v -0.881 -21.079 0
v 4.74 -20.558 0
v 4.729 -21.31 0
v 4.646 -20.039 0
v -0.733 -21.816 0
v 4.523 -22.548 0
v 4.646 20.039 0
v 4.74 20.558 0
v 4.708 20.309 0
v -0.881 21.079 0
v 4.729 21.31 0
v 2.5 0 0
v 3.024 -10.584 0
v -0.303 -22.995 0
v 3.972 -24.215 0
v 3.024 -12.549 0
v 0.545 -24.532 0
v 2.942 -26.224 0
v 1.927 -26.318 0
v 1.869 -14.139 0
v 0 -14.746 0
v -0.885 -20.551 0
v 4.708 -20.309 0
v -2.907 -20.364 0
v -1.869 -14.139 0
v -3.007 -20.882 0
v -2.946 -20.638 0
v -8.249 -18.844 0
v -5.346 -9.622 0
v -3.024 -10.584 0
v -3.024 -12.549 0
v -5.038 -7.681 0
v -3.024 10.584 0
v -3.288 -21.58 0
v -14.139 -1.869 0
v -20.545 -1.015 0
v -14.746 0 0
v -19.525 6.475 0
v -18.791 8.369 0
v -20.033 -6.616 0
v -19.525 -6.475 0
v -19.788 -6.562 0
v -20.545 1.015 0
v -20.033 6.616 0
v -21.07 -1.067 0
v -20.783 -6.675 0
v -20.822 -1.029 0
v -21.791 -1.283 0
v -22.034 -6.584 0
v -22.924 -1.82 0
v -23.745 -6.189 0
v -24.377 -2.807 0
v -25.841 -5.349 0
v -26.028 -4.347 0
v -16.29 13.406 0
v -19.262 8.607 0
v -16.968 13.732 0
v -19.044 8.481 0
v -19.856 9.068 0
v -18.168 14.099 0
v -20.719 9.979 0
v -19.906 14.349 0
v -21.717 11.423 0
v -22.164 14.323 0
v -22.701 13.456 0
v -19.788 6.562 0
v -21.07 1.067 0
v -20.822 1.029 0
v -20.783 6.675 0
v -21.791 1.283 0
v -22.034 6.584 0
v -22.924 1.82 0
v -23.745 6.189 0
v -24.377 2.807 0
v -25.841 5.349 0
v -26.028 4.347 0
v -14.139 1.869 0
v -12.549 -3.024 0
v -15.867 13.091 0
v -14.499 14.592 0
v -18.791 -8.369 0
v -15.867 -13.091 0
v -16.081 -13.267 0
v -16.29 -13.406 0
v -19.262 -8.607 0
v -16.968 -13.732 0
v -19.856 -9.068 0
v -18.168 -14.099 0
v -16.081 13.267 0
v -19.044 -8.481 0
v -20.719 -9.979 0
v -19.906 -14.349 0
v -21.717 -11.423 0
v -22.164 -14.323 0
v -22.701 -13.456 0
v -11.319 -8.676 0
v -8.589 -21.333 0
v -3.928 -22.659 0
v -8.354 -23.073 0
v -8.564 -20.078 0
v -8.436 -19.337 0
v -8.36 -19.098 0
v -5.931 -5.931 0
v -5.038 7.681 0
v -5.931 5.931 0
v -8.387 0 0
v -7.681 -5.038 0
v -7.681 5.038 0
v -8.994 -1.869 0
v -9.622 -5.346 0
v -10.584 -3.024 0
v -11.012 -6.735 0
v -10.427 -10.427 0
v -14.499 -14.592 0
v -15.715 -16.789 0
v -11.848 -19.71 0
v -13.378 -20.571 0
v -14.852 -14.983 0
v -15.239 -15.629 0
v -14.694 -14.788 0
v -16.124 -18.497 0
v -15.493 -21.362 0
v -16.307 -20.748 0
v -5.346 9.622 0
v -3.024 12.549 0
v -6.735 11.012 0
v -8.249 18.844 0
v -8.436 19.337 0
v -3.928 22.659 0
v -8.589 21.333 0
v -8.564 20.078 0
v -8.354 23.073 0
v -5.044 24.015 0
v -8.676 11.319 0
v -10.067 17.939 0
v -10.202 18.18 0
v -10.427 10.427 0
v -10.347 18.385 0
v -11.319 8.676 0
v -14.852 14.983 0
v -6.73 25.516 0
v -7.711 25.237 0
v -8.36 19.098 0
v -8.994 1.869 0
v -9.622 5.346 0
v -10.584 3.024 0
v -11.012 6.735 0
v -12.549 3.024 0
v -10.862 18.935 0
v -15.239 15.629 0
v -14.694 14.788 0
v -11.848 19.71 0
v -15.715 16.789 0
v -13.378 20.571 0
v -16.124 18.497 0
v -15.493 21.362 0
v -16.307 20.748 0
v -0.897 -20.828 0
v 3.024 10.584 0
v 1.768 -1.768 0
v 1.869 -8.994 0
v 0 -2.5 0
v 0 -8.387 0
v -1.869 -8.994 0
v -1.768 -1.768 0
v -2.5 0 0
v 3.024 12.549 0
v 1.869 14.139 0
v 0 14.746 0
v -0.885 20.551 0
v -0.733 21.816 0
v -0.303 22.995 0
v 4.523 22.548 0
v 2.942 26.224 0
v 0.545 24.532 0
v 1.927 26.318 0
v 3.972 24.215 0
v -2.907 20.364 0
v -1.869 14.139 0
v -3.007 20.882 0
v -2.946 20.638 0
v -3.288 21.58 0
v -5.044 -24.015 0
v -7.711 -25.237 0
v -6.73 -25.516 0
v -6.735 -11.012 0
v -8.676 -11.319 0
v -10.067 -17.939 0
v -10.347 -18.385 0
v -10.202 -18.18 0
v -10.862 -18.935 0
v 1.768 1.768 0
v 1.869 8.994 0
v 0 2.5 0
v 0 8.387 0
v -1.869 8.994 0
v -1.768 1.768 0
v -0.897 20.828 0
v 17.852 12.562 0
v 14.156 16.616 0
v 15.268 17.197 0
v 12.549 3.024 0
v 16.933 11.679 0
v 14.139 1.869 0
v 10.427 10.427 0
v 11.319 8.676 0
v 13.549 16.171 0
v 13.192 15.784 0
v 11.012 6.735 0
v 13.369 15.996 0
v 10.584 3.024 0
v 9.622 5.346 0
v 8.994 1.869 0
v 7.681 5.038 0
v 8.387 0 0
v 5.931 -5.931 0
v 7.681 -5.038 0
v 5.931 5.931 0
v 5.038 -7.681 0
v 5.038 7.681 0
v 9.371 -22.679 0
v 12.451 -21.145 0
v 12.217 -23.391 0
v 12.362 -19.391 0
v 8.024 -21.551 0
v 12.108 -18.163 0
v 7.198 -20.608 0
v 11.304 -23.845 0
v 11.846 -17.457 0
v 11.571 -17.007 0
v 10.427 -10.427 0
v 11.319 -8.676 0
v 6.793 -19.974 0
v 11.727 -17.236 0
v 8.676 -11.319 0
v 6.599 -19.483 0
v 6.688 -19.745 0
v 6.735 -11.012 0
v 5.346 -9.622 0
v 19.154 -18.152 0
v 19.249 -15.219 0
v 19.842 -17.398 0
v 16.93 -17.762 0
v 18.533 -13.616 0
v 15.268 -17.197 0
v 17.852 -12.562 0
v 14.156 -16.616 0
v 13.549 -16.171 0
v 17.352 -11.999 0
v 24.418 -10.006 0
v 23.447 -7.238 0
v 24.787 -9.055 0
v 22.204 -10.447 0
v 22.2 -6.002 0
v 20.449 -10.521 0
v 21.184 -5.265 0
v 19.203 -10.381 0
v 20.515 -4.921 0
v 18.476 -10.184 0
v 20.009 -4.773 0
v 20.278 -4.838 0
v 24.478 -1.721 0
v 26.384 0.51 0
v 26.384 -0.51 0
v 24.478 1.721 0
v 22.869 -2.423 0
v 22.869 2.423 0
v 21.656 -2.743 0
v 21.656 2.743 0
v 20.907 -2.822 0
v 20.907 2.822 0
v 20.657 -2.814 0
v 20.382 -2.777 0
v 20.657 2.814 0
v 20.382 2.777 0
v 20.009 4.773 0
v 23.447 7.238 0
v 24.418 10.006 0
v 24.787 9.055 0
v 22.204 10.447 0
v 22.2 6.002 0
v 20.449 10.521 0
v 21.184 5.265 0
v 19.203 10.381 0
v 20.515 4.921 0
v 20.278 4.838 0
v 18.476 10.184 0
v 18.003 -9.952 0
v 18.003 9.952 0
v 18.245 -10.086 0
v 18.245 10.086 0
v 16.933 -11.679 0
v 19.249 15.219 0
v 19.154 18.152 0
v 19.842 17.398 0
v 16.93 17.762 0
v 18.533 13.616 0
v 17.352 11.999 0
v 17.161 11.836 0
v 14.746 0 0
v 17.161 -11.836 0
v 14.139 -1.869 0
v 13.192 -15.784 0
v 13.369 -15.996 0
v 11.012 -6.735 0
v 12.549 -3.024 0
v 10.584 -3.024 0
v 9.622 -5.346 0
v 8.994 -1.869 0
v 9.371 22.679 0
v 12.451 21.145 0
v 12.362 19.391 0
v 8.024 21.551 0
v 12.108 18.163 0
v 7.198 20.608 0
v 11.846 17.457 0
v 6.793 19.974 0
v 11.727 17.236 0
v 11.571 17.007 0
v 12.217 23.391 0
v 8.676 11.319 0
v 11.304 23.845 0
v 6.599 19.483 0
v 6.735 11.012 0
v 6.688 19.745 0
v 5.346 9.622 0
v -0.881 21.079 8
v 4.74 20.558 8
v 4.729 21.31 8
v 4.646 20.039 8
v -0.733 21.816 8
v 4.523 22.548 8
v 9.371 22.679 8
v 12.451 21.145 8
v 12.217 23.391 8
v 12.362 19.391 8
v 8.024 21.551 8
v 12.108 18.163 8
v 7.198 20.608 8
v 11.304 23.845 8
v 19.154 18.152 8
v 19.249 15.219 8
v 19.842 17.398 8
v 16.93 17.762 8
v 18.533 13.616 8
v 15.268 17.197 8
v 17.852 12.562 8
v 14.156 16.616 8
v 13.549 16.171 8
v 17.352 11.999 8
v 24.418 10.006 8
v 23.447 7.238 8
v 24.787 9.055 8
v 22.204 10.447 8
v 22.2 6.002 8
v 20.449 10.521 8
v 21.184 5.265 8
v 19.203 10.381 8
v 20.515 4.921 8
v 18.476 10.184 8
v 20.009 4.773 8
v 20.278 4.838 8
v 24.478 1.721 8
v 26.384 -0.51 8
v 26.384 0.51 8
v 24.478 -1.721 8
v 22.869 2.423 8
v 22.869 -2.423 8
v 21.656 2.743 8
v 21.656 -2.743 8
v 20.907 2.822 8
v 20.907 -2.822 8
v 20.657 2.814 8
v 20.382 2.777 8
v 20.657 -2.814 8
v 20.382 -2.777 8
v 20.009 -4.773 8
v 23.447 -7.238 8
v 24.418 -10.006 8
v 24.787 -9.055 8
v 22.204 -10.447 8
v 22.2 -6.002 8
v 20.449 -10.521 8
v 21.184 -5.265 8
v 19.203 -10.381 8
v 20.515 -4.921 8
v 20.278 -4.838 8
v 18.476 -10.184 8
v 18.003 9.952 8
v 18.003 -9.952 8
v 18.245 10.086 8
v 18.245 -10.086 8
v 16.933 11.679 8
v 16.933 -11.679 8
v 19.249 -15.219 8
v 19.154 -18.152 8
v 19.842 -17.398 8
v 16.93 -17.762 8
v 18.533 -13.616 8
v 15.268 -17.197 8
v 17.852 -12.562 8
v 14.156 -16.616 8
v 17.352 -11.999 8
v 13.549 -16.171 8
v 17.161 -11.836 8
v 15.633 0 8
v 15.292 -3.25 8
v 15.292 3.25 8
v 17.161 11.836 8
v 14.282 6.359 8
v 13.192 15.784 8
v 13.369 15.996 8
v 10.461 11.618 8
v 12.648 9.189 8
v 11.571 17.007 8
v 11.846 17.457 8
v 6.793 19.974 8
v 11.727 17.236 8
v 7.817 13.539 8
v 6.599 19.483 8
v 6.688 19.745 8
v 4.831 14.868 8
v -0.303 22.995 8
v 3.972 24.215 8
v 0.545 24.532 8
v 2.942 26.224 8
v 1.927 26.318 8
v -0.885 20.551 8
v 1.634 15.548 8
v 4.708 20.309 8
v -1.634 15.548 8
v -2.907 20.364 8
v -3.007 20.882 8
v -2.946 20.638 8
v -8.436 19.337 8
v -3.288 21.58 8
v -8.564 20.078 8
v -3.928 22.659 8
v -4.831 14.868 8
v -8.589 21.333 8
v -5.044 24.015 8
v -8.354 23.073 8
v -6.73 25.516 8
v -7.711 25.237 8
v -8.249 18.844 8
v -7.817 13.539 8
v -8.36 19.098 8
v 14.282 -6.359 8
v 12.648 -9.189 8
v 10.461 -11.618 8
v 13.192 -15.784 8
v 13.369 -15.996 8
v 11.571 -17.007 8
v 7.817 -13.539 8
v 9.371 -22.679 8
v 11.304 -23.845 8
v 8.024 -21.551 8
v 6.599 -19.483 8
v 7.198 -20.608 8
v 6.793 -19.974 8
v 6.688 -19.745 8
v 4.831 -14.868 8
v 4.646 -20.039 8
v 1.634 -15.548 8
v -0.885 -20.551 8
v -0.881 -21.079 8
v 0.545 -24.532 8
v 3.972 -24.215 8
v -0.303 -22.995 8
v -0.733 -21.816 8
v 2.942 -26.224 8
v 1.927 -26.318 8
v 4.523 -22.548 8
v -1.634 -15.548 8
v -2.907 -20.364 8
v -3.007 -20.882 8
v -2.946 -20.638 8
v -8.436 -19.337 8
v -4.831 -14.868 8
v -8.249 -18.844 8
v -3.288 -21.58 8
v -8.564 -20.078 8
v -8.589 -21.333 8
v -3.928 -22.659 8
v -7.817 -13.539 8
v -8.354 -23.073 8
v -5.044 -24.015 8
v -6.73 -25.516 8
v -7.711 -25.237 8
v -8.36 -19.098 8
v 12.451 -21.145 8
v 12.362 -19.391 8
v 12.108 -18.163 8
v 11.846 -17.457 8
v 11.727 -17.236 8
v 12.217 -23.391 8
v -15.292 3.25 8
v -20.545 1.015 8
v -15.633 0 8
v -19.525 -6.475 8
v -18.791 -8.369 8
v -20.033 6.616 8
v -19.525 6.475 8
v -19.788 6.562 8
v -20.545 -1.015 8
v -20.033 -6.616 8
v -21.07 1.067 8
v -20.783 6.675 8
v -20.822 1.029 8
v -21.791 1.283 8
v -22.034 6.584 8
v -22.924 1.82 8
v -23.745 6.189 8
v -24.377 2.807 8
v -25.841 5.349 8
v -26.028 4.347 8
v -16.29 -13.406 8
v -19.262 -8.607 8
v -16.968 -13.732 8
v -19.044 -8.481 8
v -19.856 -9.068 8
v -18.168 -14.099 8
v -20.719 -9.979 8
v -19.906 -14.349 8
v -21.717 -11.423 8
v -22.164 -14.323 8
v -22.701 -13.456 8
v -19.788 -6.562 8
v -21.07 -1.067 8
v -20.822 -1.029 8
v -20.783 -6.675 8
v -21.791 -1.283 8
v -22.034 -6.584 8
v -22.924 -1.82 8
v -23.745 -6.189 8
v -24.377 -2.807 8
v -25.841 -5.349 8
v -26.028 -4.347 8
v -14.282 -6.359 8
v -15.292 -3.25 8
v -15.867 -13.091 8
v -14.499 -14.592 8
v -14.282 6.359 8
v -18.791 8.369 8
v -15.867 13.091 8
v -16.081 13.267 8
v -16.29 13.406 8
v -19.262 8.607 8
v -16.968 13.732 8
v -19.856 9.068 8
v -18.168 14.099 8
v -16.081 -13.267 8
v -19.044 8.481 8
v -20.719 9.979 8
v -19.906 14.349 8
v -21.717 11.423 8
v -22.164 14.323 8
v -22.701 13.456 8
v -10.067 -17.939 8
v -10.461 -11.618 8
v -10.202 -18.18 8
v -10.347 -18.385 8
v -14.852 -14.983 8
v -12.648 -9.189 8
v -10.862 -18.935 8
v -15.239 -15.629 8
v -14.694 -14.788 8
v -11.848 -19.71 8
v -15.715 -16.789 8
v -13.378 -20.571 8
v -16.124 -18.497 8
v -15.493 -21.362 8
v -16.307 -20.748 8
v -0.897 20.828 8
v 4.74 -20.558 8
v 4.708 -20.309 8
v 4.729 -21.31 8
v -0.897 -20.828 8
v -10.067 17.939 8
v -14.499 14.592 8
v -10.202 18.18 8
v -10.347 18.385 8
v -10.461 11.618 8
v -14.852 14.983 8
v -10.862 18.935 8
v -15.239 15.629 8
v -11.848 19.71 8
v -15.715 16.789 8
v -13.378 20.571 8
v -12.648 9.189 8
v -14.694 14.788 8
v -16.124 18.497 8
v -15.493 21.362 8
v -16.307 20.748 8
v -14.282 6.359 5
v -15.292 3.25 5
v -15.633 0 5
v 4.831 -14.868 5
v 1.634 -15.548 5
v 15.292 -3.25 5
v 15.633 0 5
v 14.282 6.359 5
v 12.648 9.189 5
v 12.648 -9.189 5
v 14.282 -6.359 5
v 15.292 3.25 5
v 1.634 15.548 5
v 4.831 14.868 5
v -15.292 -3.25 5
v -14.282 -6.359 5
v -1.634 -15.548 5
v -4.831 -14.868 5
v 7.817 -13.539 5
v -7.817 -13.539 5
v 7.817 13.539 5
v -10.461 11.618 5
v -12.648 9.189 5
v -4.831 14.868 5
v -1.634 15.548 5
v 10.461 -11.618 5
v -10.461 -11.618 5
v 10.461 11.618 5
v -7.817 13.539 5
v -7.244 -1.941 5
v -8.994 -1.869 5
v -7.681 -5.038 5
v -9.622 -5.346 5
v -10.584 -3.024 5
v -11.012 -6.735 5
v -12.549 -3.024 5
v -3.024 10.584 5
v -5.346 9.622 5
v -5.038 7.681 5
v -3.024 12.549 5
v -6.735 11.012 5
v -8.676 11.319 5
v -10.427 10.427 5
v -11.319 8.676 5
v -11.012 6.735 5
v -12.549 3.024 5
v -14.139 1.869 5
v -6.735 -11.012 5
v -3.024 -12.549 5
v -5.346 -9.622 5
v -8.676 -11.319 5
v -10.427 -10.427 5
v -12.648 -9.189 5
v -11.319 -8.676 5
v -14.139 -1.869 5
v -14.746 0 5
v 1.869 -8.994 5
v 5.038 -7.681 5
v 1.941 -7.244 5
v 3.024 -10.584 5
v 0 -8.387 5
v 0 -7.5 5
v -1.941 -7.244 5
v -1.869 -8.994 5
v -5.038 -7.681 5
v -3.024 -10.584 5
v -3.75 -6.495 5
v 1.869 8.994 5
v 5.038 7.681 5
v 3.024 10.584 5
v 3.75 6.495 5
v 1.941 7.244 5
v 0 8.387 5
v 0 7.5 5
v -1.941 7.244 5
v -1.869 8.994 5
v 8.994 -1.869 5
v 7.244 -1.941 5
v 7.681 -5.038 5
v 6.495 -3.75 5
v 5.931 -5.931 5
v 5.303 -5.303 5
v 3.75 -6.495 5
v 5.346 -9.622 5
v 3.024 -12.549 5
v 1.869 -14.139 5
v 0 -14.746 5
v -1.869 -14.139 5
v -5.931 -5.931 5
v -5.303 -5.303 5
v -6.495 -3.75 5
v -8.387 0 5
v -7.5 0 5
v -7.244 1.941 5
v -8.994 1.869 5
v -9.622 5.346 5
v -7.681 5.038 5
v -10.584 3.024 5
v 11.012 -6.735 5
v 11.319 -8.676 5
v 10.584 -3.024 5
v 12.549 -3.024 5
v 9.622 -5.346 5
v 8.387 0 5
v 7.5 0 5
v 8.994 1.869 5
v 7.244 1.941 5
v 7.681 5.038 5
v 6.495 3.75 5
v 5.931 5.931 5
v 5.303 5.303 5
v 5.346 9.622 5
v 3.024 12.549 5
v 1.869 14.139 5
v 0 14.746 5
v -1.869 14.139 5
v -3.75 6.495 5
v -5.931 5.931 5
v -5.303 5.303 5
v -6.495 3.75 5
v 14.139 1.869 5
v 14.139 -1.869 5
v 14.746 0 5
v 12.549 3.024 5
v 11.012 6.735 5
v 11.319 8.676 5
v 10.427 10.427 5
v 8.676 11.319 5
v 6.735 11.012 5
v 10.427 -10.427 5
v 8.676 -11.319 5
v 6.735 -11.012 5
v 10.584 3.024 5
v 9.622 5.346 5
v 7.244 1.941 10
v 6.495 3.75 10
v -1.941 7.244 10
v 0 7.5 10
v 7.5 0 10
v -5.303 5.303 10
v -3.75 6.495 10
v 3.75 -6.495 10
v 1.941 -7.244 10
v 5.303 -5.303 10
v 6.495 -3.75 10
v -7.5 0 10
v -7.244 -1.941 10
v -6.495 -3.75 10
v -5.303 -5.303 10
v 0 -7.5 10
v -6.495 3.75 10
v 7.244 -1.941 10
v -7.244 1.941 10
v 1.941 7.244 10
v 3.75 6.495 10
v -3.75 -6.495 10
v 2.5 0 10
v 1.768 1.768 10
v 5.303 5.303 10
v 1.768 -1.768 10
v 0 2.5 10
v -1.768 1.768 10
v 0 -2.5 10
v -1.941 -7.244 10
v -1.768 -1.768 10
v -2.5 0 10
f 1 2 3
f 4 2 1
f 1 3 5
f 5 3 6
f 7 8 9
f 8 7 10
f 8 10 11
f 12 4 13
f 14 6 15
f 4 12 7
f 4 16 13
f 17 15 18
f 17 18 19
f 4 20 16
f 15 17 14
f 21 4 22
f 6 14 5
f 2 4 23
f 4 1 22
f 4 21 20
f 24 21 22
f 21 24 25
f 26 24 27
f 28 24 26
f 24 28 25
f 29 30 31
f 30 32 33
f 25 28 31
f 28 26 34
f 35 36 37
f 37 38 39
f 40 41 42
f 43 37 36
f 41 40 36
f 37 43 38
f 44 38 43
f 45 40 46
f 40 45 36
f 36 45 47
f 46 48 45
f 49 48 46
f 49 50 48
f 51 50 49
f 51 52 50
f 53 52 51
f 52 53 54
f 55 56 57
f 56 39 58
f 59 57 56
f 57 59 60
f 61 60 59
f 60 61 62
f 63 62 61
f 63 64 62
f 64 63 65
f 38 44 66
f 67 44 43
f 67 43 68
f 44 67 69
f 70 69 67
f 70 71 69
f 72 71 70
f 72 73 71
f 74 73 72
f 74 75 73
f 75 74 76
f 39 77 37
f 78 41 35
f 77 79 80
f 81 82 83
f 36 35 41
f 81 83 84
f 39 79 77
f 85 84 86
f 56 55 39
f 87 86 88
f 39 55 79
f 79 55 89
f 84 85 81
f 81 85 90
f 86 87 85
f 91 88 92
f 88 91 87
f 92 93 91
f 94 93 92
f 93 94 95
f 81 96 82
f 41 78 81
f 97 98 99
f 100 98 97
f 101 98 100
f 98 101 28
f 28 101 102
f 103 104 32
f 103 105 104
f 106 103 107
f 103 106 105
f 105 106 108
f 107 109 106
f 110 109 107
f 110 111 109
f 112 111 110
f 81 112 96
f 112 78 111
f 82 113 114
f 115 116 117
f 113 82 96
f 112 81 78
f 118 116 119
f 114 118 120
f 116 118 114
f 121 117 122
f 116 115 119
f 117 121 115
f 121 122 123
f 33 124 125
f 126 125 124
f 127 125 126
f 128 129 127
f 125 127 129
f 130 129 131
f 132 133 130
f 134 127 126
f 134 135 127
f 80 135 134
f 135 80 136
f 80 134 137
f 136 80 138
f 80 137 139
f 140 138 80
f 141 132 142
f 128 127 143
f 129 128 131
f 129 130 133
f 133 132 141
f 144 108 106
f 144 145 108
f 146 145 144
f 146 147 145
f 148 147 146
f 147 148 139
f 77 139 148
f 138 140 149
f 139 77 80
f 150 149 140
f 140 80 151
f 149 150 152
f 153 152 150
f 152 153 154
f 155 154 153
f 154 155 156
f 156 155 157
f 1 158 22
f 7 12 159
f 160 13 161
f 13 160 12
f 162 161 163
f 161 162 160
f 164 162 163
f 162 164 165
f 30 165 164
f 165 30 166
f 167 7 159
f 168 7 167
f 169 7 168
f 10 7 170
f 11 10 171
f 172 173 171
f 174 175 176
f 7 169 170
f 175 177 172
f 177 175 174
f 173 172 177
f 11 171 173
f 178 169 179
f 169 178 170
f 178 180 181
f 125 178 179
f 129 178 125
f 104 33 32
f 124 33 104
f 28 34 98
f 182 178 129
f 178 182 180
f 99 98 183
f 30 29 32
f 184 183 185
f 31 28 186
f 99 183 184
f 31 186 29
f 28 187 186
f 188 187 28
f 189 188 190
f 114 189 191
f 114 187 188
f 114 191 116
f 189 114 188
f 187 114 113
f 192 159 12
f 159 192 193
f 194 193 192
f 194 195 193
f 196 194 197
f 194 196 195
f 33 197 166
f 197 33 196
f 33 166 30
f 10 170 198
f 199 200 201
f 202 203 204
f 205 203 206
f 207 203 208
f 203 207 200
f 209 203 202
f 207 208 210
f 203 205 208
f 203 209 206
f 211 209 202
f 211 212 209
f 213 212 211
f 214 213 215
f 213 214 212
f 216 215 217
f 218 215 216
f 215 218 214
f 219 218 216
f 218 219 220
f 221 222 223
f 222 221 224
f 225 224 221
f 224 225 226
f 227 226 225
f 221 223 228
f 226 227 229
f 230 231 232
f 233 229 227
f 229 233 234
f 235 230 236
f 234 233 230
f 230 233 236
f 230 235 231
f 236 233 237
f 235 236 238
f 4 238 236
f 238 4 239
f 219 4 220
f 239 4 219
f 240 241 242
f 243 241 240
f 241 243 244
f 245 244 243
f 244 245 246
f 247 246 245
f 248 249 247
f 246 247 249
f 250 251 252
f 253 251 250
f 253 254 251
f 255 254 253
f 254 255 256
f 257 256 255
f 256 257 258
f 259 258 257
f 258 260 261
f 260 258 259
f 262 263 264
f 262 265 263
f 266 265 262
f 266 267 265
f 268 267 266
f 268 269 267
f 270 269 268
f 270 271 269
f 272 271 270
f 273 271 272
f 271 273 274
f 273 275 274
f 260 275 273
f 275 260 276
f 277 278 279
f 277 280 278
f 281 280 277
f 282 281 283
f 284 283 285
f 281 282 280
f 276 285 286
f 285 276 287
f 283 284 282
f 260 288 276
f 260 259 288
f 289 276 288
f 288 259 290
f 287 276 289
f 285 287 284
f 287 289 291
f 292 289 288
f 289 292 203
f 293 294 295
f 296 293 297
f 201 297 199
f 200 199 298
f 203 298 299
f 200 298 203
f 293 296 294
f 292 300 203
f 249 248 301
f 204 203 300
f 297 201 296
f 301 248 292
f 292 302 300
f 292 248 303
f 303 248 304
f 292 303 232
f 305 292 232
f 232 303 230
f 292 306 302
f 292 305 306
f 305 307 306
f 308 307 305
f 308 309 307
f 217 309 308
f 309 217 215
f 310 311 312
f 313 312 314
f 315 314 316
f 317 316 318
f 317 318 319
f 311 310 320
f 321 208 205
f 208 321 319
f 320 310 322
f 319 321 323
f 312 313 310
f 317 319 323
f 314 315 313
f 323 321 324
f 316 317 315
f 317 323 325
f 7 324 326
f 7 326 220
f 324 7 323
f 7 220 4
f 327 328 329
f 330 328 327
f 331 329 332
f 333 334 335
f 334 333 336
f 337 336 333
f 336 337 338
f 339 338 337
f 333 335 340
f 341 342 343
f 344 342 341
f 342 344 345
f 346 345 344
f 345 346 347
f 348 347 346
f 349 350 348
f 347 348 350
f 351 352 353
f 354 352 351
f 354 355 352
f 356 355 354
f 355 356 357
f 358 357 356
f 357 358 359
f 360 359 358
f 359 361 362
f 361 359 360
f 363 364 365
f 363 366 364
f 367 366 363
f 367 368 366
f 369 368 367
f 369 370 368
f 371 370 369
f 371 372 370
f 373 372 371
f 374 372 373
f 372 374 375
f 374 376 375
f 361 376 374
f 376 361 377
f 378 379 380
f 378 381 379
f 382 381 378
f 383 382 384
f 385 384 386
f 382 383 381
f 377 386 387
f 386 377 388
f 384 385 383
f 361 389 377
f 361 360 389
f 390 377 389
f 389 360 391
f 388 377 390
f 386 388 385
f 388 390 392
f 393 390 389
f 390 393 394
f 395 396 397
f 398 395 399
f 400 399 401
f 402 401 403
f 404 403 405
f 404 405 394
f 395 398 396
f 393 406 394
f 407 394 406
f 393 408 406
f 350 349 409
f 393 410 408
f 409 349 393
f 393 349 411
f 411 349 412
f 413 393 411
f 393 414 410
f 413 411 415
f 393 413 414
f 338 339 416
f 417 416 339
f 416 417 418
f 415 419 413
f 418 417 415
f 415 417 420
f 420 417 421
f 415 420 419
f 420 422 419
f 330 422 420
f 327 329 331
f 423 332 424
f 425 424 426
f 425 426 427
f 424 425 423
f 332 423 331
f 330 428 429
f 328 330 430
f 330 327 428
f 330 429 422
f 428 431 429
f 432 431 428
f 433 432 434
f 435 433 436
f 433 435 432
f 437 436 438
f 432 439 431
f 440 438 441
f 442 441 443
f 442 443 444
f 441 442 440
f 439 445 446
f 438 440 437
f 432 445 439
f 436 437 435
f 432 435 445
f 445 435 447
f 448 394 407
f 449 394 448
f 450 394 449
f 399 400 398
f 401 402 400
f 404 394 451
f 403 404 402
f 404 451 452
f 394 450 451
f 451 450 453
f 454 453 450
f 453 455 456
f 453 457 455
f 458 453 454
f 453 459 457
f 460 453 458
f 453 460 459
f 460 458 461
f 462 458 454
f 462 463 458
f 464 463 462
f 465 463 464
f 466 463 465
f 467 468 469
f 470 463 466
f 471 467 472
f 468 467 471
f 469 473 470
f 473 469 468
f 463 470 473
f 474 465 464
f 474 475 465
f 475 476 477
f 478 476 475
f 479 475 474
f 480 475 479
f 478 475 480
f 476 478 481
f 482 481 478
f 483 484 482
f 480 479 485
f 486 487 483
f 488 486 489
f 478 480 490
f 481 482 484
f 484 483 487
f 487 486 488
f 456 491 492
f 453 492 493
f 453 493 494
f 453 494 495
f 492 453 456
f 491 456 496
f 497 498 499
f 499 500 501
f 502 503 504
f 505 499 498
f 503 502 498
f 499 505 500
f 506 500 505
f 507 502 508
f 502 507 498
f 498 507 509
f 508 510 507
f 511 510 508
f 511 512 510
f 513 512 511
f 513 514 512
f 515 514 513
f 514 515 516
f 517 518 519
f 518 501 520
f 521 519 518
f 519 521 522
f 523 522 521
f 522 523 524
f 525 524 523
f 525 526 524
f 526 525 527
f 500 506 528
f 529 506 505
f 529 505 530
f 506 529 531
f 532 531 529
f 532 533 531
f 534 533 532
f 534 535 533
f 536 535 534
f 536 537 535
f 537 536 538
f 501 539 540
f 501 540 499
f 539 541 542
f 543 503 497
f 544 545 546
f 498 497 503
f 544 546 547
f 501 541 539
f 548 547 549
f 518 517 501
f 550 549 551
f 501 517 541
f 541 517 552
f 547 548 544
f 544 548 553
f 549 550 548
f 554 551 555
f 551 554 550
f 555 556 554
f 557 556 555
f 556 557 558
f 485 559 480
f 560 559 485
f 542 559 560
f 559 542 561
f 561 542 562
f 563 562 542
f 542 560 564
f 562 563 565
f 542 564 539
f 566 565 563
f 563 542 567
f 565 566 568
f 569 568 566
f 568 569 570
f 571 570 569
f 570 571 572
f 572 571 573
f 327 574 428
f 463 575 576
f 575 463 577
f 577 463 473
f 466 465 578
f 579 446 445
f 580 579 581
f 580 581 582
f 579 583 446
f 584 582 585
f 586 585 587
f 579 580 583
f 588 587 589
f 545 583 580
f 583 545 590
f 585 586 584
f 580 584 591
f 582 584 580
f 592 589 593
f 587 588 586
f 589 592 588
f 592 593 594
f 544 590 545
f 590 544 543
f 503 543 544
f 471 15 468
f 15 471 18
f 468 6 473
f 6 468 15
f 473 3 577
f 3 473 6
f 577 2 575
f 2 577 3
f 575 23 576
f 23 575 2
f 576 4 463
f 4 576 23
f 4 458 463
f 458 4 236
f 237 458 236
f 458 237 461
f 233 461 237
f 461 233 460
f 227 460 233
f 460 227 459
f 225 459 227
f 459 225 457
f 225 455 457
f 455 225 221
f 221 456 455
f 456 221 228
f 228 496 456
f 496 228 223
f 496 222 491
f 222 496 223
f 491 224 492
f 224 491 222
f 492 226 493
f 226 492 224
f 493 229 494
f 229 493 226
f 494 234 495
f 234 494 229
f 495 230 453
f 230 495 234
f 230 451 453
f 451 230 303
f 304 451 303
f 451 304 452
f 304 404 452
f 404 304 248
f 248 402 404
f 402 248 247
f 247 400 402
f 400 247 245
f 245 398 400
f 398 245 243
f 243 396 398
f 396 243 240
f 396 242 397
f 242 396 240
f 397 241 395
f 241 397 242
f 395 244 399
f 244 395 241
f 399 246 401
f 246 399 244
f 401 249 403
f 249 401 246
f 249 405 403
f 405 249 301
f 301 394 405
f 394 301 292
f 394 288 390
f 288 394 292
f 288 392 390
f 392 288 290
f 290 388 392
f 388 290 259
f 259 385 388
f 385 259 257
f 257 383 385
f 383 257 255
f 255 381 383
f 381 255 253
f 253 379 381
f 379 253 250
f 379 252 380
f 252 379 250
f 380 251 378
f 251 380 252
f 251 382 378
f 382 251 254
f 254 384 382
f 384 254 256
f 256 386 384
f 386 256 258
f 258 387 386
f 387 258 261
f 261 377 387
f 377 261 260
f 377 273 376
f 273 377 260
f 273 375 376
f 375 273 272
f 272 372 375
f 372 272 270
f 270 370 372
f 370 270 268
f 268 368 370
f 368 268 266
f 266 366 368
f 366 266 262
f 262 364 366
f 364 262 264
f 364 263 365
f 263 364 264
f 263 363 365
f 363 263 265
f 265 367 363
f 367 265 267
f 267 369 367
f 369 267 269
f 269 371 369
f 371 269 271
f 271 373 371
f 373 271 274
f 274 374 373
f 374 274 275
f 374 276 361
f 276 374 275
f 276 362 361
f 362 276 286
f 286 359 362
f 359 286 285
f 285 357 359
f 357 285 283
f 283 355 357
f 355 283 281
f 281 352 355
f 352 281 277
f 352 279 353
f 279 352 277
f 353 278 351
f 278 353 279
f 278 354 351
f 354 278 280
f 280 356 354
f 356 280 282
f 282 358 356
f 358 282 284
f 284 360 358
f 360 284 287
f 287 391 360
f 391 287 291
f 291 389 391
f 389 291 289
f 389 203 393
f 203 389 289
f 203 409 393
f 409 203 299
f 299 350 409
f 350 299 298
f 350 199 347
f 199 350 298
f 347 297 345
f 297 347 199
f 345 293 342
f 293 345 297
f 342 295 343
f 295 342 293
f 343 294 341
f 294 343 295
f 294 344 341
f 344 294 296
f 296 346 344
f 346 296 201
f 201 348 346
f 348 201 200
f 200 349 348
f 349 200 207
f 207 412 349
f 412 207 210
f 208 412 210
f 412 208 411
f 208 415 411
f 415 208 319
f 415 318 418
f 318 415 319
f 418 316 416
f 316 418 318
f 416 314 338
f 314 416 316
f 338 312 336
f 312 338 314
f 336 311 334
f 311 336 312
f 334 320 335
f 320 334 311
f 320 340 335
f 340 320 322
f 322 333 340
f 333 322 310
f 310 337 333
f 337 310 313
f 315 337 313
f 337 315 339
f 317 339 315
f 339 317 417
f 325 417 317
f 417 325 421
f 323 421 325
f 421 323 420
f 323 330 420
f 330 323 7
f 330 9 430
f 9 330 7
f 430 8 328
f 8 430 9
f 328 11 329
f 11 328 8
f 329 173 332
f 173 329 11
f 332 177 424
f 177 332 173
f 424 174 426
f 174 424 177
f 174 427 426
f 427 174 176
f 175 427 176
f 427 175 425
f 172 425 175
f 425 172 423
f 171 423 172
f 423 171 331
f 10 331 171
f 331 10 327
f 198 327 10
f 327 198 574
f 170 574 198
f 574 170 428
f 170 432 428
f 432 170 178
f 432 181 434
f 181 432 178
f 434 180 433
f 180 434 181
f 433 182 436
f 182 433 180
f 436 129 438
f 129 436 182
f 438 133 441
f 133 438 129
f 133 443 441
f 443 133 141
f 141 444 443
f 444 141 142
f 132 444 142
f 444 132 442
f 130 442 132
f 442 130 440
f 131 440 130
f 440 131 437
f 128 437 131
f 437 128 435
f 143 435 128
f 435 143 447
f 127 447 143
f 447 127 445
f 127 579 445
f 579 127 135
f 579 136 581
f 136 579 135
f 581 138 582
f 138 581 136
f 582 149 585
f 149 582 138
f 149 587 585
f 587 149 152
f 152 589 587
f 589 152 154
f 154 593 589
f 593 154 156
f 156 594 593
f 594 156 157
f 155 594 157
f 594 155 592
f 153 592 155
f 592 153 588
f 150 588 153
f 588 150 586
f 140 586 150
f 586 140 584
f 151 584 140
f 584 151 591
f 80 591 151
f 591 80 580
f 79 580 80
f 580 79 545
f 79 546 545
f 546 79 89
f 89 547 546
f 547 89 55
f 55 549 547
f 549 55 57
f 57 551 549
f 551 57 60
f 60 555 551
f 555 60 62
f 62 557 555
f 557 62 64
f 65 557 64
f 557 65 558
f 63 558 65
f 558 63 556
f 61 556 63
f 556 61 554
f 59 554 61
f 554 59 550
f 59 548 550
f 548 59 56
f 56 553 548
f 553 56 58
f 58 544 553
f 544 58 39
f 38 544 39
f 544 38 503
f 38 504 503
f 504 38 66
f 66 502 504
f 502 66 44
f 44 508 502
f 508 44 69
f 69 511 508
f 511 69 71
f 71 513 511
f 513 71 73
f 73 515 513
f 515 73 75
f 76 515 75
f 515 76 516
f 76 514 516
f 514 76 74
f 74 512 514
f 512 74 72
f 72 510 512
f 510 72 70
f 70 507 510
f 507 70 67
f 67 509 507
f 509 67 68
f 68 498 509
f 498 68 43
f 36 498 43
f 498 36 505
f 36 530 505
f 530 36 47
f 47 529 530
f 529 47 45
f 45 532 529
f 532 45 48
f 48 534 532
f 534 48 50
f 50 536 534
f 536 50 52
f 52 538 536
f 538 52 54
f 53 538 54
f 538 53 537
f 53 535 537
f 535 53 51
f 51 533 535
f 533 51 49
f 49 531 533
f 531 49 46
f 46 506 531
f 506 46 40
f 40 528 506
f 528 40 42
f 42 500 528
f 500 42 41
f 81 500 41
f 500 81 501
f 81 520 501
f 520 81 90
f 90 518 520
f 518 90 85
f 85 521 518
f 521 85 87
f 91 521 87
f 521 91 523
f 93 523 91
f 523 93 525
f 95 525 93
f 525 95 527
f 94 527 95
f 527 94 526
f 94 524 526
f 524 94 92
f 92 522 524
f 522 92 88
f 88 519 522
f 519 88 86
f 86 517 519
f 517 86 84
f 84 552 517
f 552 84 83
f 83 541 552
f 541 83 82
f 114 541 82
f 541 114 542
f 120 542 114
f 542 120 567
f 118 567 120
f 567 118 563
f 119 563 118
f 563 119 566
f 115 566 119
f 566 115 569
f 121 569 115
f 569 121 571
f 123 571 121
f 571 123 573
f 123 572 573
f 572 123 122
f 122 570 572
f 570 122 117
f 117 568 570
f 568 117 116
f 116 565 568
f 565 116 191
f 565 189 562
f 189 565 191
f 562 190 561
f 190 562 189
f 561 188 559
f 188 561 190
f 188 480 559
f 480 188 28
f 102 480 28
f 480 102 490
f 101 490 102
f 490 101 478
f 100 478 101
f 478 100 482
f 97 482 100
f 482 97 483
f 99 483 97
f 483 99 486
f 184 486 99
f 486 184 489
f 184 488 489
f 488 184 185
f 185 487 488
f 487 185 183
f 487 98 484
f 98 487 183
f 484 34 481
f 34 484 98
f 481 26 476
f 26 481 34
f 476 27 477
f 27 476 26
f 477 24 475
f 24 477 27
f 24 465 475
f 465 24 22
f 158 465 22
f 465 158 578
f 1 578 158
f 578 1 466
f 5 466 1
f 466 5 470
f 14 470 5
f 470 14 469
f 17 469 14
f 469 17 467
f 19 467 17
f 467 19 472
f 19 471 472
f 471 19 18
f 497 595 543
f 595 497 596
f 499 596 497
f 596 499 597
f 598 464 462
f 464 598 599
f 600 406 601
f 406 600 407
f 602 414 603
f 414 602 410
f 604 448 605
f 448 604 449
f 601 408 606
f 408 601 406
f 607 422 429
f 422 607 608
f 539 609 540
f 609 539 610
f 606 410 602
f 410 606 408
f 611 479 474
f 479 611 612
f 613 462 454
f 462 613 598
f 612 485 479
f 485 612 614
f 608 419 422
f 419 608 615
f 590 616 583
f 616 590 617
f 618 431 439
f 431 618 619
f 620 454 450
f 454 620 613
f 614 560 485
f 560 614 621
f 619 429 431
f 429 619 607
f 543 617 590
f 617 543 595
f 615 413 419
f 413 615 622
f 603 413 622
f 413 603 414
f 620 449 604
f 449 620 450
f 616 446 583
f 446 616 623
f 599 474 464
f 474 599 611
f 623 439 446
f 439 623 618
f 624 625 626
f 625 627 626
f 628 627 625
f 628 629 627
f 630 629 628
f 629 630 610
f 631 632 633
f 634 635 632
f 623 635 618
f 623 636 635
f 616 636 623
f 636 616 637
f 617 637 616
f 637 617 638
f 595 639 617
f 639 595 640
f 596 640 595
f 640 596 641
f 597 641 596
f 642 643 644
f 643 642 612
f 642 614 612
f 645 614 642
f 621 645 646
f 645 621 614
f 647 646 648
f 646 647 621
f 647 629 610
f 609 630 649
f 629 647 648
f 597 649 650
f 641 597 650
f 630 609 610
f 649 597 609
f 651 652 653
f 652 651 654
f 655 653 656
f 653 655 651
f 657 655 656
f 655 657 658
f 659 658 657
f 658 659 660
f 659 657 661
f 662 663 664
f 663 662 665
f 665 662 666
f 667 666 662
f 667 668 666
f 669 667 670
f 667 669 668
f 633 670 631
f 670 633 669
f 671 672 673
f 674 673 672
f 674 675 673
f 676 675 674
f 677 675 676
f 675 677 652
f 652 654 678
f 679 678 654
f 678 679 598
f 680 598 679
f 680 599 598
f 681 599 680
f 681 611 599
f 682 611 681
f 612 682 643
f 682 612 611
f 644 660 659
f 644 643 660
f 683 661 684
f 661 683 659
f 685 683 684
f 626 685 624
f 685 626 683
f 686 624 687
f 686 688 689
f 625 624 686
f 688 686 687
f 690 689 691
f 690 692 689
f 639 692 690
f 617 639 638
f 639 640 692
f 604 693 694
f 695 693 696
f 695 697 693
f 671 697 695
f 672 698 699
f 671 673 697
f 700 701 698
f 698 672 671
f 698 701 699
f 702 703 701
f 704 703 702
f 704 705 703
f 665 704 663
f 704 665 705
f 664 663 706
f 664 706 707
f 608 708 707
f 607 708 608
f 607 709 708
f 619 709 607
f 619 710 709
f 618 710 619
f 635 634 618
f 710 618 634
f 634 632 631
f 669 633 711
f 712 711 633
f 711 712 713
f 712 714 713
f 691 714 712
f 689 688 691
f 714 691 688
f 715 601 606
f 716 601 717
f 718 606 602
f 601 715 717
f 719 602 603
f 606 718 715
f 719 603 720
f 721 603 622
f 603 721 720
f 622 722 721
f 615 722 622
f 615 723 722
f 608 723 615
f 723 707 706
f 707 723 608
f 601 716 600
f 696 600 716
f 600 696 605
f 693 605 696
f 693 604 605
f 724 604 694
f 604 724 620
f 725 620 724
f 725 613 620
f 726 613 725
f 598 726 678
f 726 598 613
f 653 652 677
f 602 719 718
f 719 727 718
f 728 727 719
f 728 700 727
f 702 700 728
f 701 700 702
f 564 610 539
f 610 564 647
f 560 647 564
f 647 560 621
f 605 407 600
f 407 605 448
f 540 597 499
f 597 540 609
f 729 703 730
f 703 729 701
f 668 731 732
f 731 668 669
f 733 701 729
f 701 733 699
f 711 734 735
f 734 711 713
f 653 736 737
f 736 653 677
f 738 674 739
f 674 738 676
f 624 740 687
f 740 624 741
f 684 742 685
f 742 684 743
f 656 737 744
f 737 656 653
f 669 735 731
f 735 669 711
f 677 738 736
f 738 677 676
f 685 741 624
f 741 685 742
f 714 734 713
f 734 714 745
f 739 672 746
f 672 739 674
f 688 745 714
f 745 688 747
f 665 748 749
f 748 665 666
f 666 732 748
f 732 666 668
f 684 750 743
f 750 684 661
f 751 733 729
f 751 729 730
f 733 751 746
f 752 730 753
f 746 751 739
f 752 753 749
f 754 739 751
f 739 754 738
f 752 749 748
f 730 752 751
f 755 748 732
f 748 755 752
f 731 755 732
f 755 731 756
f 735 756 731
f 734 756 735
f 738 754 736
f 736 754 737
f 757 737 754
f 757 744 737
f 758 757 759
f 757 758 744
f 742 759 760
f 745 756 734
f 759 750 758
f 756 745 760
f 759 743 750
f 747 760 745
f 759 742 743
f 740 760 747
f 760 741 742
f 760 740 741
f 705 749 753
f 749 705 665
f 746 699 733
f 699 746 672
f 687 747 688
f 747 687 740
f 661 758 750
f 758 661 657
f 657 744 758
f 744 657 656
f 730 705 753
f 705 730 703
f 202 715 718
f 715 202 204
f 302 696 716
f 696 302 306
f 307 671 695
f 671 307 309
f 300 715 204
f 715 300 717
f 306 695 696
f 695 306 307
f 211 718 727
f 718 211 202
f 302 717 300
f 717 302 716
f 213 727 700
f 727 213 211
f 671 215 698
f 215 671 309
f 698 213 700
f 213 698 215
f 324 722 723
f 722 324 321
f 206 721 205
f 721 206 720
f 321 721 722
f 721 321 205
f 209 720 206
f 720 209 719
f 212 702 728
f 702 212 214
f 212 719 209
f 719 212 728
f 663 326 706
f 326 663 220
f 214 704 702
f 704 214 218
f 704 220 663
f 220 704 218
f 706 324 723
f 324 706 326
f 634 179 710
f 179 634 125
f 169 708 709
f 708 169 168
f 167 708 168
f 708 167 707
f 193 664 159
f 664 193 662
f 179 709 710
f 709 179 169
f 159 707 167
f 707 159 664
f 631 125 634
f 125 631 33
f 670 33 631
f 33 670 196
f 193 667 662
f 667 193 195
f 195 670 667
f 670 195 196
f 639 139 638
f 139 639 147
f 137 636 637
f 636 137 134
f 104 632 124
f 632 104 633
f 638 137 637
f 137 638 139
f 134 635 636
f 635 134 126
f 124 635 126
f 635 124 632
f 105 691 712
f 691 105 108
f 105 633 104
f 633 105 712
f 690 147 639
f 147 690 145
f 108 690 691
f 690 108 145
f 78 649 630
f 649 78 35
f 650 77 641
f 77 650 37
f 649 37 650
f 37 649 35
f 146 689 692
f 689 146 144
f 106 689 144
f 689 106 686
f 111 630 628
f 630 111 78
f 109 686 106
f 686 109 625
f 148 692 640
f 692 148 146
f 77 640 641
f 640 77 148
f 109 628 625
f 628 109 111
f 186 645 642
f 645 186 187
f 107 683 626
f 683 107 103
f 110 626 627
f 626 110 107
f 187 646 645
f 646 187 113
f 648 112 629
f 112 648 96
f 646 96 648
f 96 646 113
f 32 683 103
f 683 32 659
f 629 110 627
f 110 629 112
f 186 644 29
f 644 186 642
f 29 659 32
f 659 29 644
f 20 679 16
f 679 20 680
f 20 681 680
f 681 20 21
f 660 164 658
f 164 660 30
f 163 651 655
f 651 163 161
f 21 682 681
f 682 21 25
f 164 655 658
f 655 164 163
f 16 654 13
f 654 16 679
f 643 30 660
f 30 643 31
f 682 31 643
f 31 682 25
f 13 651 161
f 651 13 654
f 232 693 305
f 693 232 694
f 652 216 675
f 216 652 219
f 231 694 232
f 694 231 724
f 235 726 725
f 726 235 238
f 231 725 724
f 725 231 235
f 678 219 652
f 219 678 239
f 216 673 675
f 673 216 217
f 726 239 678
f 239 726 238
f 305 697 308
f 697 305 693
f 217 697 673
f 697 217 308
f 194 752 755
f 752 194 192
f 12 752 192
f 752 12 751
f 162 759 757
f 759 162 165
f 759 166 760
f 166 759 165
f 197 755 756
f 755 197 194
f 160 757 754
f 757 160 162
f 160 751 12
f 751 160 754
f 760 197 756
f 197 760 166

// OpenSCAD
use <MCAD/involute_gears.scad>

//test_gears();

gear (number_of_teeth=17,
			circular_pitch=500,
			circles=8);
